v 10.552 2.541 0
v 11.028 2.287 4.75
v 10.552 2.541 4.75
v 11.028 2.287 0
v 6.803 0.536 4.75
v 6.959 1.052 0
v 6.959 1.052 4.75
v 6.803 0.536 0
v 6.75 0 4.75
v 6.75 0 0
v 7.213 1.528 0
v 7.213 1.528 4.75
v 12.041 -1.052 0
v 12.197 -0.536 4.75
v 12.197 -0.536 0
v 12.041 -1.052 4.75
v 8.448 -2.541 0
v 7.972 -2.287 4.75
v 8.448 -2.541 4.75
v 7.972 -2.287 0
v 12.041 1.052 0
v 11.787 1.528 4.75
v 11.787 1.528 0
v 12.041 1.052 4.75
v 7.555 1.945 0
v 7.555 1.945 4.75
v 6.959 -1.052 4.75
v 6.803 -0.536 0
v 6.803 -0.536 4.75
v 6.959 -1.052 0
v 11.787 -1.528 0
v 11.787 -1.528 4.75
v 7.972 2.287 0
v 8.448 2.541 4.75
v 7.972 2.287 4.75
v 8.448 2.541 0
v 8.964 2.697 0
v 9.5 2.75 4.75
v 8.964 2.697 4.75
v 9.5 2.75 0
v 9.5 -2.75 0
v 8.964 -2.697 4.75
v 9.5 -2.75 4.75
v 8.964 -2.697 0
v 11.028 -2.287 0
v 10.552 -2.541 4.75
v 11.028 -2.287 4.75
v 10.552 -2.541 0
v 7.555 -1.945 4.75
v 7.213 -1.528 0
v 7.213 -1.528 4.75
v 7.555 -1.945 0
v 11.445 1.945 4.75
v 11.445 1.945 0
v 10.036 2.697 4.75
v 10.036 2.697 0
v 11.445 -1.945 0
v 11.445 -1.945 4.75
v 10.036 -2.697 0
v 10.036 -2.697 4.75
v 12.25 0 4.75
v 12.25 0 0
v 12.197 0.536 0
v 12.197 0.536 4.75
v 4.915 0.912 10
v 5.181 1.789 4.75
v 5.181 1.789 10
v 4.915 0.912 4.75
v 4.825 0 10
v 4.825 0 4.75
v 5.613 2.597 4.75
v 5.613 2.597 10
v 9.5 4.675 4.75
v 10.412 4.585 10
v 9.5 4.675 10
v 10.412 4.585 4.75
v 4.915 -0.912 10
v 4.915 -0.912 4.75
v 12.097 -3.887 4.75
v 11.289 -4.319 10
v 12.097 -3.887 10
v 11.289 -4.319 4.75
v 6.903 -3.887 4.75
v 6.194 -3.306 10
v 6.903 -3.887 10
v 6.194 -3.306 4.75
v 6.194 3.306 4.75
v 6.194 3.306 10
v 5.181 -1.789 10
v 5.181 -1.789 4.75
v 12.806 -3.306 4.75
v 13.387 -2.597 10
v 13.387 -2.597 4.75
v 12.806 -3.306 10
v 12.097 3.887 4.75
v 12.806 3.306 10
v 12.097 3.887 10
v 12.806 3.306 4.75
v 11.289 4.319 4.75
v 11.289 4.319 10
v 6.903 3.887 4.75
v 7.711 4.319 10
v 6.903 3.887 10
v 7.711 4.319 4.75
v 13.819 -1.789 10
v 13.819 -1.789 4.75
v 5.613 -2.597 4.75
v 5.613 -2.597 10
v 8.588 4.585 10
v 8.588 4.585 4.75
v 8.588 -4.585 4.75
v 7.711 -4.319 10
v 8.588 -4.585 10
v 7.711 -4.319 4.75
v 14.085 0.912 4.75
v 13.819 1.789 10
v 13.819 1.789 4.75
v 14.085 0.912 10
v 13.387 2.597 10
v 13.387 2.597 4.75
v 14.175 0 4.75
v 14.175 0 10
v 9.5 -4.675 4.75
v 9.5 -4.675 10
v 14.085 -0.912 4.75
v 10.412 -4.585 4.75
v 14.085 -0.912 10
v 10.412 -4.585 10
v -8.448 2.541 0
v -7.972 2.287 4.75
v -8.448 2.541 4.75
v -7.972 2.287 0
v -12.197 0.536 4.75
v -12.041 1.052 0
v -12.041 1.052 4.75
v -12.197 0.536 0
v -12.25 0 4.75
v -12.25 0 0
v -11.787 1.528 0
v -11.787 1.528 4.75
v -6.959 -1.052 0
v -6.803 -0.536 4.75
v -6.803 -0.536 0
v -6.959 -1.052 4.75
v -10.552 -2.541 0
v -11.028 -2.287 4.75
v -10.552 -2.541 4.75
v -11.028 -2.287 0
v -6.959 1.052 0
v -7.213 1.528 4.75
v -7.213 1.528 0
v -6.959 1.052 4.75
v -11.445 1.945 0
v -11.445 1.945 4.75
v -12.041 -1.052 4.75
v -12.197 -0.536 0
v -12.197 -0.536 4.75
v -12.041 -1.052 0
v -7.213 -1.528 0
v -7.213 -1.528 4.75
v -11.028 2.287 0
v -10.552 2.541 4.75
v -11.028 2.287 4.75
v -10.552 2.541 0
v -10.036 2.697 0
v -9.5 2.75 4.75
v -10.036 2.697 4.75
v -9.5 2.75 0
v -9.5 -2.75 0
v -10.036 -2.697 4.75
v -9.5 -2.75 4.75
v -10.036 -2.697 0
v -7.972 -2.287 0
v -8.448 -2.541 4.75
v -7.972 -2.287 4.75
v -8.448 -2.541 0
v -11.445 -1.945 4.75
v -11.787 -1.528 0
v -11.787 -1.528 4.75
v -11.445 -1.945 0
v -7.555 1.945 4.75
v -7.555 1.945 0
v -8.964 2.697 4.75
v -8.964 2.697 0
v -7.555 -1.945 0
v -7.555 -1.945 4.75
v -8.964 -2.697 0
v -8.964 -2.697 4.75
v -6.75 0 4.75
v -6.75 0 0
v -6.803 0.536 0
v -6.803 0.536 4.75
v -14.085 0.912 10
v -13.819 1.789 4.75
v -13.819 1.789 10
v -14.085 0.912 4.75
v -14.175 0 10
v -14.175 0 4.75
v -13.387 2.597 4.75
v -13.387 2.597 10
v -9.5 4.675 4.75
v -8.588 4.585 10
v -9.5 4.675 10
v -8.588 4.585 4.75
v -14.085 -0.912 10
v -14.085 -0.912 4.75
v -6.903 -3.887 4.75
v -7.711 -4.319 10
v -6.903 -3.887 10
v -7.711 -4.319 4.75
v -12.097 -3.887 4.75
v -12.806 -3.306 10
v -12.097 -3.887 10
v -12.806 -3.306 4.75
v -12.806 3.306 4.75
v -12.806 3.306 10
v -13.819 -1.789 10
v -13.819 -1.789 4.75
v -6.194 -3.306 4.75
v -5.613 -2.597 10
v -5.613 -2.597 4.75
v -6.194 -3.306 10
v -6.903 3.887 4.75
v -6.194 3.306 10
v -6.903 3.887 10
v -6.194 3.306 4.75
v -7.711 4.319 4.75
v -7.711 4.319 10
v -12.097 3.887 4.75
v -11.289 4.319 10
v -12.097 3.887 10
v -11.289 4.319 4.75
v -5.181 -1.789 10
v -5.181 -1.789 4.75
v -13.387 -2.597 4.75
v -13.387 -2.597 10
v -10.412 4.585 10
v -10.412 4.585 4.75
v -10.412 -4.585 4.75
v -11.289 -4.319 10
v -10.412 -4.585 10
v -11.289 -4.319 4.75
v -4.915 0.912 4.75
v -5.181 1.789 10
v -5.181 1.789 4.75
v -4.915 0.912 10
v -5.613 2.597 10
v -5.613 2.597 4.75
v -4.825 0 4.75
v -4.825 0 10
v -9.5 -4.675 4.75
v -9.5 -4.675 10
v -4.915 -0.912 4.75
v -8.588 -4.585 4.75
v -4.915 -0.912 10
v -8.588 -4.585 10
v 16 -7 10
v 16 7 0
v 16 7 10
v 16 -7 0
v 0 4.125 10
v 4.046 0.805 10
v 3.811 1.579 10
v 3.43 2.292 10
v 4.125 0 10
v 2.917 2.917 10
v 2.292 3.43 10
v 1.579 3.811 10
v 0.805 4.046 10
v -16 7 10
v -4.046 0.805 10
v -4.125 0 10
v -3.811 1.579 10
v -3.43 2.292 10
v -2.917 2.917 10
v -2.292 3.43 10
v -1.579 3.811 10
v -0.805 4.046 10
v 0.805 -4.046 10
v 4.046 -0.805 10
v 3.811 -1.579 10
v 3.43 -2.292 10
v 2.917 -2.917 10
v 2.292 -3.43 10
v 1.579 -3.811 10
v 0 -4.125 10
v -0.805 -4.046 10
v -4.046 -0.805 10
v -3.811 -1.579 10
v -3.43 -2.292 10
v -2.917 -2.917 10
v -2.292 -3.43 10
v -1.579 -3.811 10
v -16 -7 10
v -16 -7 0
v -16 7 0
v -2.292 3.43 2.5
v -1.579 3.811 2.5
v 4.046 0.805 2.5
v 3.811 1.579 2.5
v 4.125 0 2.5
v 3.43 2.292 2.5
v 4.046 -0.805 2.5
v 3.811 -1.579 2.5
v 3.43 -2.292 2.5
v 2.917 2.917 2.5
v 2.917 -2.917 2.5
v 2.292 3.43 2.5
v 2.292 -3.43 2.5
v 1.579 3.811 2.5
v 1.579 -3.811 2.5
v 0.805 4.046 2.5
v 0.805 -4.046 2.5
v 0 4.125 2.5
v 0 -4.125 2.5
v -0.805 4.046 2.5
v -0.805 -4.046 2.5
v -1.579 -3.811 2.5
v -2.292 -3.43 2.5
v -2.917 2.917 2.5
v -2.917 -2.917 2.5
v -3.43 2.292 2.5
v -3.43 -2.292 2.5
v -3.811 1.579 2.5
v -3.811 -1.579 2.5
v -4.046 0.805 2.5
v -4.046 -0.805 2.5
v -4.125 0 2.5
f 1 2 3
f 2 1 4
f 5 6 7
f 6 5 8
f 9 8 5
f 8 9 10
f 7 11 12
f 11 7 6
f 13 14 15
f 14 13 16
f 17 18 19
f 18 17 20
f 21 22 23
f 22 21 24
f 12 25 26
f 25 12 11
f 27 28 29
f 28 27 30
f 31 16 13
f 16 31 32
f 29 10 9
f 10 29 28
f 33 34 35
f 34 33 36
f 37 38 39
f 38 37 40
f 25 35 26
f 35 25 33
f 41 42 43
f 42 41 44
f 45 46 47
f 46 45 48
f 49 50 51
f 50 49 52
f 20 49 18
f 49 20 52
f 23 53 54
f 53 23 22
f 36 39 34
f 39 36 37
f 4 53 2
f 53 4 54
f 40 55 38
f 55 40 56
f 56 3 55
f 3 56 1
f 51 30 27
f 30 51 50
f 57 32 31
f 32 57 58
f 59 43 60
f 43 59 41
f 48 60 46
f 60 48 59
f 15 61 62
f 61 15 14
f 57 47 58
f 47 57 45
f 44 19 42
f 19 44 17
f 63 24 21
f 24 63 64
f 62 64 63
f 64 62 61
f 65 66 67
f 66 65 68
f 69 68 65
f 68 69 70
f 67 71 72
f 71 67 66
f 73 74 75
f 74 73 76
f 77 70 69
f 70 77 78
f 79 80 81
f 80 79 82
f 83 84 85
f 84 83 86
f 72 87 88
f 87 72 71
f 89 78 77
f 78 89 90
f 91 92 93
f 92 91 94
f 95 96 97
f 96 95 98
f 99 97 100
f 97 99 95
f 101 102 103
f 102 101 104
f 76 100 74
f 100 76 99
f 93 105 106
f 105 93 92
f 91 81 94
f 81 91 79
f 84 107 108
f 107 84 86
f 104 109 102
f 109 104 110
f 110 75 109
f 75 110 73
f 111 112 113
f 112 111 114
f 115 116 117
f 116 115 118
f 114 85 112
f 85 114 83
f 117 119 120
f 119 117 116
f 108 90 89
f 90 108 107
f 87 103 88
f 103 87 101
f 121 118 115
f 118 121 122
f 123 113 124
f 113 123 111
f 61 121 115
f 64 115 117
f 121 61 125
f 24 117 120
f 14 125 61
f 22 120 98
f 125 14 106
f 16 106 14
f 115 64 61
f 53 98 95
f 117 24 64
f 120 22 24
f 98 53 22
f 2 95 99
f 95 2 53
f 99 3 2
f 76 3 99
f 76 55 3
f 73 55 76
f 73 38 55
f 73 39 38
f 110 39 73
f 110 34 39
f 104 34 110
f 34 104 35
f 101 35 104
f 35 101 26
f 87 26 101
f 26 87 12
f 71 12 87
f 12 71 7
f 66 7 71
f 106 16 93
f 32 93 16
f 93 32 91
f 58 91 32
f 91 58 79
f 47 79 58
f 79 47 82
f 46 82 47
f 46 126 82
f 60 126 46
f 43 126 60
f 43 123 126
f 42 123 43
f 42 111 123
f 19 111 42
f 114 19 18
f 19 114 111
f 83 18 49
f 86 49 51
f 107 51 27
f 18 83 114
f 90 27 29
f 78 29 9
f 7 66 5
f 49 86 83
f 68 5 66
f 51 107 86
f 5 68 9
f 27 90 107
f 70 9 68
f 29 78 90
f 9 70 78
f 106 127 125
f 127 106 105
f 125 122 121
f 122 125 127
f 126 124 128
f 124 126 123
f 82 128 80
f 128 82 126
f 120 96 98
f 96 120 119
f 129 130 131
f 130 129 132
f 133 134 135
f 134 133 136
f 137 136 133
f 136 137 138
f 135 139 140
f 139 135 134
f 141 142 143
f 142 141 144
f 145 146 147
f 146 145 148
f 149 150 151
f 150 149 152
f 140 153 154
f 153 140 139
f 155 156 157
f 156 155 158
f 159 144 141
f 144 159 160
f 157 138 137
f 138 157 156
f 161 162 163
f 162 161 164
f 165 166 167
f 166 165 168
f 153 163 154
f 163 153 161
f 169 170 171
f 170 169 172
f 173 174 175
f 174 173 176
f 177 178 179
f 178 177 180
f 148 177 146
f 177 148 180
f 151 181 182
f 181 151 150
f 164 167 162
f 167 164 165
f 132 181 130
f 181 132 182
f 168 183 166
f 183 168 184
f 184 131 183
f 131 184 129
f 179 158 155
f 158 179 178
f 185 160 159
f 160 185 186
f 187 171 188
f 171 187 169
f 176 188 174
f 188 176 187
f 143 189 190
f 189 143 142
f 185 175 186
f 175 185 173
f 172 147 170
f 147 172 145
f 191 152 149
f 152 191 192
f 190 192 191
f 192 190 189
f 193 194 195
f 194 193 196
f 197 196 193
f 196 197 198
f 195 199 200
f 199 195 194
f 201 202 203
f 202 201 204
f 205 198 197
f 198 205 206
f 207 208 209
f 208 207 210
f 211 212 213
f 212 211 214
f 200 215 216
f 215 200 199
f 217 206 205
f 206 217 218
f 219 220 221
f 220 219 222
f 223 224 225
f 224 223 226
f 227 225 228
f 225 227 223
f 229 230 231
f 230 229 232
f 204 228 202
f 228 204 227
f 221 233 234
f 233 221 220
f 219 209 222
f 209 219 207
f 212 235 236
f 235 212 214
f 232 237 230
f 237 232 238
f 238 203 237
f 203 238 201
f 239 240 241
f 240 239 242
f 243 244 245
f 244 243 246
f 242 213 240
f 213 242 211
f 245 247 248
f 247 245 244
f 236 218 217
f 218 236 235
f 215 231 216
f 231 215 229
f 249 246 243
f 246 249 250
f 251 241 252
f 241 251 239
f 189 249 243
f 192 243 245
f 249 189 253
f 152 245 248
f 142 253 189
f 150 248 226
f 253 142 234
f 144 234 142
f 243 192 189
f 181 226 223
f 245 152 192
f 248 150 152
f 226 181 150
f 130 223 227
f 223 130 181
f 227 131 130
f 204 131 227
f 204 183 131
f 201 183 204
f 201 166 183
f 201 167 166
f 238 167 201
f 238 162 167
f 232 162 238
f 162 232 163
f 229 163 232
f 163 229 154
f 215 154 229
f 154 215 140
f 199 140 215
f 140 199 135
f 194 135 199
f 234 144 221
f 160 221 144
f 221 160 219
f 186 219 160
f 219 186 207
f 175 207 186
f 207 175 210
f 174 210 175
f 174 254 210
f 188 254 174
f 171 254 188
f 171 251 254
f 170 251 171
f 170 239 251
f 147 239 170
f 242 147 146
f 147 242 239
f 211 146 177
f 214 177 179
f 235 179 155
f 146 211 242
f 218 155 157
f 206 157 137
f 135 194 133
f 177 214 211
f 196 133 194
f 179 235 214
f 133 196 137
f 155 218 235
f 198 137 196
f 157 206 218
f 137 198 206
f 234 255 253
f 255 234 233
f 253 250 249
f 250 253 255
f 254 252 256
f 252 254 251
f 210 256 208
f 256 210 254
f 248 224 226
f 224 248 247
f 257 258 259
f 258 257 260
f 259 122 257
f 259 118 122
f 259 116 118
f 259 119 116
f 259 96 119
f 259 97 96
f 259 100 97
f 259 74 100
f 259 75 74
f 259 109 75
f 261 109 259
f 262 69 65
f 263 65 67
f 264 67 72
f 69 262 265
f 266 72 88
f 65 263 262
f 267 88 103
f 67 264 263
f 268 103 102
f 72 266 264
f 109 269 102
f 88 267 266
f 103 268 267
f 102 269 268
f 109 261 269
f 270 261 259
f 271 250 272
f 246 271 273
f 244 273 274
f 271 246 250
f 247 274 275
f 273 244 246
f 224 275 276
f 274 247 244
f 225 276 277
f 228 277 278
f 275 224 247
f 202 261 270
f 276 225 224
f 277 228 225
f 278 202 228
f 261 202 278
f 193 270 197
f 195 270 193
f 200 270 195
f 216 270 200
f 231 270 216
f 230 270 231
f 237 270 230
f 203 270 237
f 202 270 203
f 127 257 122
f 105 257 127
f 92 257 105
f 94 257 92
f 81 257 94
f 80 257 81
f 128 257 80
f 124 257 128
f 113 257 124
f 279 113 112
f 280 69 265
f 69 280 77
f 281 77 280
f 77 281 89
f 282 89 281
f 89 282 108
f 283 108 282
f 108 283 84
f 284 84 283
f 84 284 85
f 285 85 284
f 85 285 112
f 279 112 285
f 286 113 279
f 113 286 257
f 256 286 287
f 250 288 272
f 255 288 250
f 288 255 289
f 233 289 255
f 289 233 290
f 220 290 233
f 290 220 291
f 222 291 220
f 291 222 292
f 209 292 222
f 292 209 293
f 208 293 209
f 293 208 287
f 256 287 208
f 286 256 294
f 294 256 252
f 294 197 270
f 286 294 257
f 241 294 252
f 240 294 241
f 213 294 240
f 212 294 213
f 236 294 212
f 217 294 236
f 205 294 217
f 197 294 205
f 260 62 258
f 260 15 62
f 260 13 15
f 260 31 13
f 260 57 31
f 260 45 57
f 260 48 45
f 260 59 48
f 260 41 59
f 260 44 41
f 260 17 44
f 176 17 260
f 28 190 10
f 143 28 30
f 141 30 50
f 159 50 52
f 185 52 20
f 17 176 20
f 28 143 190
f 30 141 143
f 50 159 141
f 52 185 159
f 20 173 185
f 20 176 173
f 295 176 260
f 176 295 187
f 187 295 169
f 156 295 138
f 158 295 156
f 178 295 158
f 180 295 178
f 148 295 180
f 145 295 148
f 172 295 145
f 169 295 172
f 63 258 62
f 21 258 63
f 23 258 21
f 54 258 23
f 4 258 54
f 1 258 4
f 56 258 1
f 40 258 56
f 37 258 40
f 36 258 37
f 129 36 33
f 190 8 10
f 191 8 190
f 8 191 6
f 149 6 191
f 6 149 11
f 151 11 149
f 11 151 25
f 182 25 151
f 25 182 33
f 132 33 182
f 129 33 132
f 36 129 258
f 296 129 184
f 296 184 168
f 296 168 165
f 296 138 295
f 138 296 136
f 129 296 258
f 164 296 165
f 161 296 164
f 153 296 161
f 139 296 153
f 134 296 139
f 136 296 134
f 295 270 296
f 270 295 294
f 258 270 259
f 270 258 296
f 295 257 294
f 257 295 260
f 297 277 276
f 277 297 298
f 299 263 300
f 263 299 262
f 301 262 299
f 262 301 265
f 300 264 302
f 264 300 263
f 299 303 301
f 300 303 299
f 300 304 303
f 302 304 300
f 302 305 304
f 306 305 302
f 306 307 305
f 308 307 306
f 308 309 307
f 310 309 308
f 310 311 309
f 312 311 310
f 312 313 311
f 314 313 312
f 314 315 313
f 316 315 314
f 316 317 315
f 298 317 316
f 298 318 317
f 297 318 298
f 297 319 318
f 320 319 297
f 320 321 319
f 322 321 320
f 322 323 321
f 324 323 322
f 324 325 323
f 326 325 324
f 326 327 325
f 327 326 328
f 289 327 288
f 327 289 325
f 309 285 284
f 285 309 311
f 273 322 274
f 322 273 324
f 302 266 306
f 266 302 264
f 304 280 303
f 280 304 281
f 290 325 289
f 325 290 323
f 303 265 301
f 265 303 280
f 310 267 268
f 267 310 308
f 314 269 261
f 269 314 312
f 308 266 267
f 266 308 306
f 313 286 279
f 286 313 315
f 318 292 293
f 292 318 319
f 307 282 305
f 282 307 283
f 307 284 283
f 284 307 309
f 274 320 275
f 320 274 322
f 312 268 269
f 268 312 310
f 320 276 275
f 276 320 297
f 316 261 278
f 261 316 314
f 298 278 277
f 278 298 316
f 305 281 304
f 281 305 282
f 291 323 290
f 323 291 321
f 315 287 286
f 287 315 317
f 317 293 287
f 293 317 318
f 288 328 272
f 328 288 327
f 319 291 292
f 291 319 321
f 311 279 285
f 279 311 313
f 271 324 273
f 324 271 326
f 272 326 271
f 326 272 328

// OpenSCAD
// file: library.scad
module lm8uu (shaft_length=100) {
  d = 15.5;
  l = 24+1;
  cylinder(d=8+4, h=shaft_length, center=true);
  cylinder(d=d, h=l, center=true);
}

module lm8uu_zip_tie (thickness, width) {
  d = 15.5;
  cylinder(d=15.5+thickness*2, h=width, center=true);
  translate([0,0+(d+thickness)/2,0]) cube([100,thickness,width], center=true);
  translate([0,0-(d+thickness)/2,0]) cube([100,thickness,width], center=true);
}

module m3_mounting_hole(use_insert_nuts=false) {
  if (!use_insert_nuts) {
    translate([0, 0, 0]) rotate([90,0,0]) cylinder(d=3+0.5, h=8);
    slot_width = 5.5+0.6;
    slot_depth = 2.4+0.6;
    translate([0, -2-(slot_depth)/2, 0]) cube([slot_width,slot_depth,100], center=true);
  } else {
    translate([0, 0 + 2.5 - 5, 0]) rotate([90,0,0]) cylinder(d=4, h=5, center=true);
  }
}

function screw_head_diameter(screw_diameter) = lookup(screw_diameter, [
   [1.4, 2.6],
   [1.6, 3],
   [2.0, 3.8],
   [2.5, 4.5],
   [3.0, 5.5],
   [4.0, 7],
   [5.0, 8.5],
   [6.0, 10],
   [8.0, 13],
   [ 10, 16],
   [ 12, 18],
   [ 14, 21],
   [ 16, 24],
   [ 18, 27],
   [ 20, 30]
 ]);

// scale allows for better fit of screw in hole
// seperation avoids overhands when printing screw hole with head at bottom
module screw (d, l, head=true, scale=1.1, separation=0) { 
  half_scale = (1+(scale-1)/2);
  cylinder(h=l, d=d*scale, center=false);
  if (head) {translate([0,0,-d*half_scale]) cylinder(
    d=screw_head_diameter(d)*scale,
    h=d*scale-separation
  );}
}

module GT2_tooth(h) {
  extra_width = 0.5;
  translate([-1,-0.5-extra_width,0]) cube([2,0.5+extra_width,h]);
  linear_extrude(height=h) polygon([[0.747183,-0.5],[0.747183,0],[0.647876,0.037218],[0.598311,0.130528],[0.578556,0.238423],[0.547158,0.343077],[0.504649,0.443762],[0.451556,0.53975],[0.358229,0.636924],[0.2484,0.707276],[0.127259,0.750044],[0,0.76447],[-0.127259,0.750044],[-0.2484,0.707276],[-0.358229,0.636924],[-0.451556,0.53975],[-0.504797,0.443762],[-0.547291,0.343077],[-0.578605,0.238423],[-0.598311,0.130528],[-0.648009,0.037218],[-0.747183,0],[-0.747183,-0.5]]);
}

module nema17(height, screw_mask_height=0, screw_mask_slot_length=0, center_mask_height=2.5) {
  difference() {
    translate([0,0,-height/2]) hull() {
      cube([42.3, 31, height], center=true);
      cube([31, 42.3, height], center=true);
    }
    translate([31/2,31/2,-4.5]) cylinder(h=9,d=3);
    translate([31/2,-31/2,-4.5]) cylinder(h=9,d=3);
    translate([-31/2,31/2,-4.5]) cylinder(h=9,d=3);
    translate([-31/2,-31/2,-4.5]) cylinder(h=9,d=3);
  }
  cylinder(h=center_mask_height, d=22+2);
  cylinder(h=27, d=5+2);
    
  screw_slot( 31/2, 31/2);
  screw_slot( 31/2,-31/2);
  screw_slot(-31/2, 31/2);
  screw_slot(-31/2,-31/2);
  
  module screw_slot(x, y) { hull() {
    dx = x > 0 ? screw_mask_slot_length/2 : -screw_mask_slot_length/2;
    dy = y > 0 ? screw_mask_slot_length/2 : -screw_mask_slot_length/2;
    translate([x+dx,y+dy,screw_mask_height]) rotate([180,0,0]) screw(d=3, l=screw_mask_height, d=3, head=false);
    translate([x-dx,y-dy,screw_mask_height]) rotate([180,0,0]) screw(d=3, l=screw_mask_height, d=3, head=false);
  }}
}
// main file
$fn = 32;
use <./library.scad>; 

difference() {
  translate([0,0,5]) cube([32,14,10], center=true);
  translate([0,0,2.5]) cylinder(d=8+0.25, h=100);
  translate([9.5,0,5]) rotate([0,180,0]) screw(d=5, l=5.1);
  translate([-9.5,0,5]) rotate([0,180,0]) screw(d=5, l=5.1);
}
